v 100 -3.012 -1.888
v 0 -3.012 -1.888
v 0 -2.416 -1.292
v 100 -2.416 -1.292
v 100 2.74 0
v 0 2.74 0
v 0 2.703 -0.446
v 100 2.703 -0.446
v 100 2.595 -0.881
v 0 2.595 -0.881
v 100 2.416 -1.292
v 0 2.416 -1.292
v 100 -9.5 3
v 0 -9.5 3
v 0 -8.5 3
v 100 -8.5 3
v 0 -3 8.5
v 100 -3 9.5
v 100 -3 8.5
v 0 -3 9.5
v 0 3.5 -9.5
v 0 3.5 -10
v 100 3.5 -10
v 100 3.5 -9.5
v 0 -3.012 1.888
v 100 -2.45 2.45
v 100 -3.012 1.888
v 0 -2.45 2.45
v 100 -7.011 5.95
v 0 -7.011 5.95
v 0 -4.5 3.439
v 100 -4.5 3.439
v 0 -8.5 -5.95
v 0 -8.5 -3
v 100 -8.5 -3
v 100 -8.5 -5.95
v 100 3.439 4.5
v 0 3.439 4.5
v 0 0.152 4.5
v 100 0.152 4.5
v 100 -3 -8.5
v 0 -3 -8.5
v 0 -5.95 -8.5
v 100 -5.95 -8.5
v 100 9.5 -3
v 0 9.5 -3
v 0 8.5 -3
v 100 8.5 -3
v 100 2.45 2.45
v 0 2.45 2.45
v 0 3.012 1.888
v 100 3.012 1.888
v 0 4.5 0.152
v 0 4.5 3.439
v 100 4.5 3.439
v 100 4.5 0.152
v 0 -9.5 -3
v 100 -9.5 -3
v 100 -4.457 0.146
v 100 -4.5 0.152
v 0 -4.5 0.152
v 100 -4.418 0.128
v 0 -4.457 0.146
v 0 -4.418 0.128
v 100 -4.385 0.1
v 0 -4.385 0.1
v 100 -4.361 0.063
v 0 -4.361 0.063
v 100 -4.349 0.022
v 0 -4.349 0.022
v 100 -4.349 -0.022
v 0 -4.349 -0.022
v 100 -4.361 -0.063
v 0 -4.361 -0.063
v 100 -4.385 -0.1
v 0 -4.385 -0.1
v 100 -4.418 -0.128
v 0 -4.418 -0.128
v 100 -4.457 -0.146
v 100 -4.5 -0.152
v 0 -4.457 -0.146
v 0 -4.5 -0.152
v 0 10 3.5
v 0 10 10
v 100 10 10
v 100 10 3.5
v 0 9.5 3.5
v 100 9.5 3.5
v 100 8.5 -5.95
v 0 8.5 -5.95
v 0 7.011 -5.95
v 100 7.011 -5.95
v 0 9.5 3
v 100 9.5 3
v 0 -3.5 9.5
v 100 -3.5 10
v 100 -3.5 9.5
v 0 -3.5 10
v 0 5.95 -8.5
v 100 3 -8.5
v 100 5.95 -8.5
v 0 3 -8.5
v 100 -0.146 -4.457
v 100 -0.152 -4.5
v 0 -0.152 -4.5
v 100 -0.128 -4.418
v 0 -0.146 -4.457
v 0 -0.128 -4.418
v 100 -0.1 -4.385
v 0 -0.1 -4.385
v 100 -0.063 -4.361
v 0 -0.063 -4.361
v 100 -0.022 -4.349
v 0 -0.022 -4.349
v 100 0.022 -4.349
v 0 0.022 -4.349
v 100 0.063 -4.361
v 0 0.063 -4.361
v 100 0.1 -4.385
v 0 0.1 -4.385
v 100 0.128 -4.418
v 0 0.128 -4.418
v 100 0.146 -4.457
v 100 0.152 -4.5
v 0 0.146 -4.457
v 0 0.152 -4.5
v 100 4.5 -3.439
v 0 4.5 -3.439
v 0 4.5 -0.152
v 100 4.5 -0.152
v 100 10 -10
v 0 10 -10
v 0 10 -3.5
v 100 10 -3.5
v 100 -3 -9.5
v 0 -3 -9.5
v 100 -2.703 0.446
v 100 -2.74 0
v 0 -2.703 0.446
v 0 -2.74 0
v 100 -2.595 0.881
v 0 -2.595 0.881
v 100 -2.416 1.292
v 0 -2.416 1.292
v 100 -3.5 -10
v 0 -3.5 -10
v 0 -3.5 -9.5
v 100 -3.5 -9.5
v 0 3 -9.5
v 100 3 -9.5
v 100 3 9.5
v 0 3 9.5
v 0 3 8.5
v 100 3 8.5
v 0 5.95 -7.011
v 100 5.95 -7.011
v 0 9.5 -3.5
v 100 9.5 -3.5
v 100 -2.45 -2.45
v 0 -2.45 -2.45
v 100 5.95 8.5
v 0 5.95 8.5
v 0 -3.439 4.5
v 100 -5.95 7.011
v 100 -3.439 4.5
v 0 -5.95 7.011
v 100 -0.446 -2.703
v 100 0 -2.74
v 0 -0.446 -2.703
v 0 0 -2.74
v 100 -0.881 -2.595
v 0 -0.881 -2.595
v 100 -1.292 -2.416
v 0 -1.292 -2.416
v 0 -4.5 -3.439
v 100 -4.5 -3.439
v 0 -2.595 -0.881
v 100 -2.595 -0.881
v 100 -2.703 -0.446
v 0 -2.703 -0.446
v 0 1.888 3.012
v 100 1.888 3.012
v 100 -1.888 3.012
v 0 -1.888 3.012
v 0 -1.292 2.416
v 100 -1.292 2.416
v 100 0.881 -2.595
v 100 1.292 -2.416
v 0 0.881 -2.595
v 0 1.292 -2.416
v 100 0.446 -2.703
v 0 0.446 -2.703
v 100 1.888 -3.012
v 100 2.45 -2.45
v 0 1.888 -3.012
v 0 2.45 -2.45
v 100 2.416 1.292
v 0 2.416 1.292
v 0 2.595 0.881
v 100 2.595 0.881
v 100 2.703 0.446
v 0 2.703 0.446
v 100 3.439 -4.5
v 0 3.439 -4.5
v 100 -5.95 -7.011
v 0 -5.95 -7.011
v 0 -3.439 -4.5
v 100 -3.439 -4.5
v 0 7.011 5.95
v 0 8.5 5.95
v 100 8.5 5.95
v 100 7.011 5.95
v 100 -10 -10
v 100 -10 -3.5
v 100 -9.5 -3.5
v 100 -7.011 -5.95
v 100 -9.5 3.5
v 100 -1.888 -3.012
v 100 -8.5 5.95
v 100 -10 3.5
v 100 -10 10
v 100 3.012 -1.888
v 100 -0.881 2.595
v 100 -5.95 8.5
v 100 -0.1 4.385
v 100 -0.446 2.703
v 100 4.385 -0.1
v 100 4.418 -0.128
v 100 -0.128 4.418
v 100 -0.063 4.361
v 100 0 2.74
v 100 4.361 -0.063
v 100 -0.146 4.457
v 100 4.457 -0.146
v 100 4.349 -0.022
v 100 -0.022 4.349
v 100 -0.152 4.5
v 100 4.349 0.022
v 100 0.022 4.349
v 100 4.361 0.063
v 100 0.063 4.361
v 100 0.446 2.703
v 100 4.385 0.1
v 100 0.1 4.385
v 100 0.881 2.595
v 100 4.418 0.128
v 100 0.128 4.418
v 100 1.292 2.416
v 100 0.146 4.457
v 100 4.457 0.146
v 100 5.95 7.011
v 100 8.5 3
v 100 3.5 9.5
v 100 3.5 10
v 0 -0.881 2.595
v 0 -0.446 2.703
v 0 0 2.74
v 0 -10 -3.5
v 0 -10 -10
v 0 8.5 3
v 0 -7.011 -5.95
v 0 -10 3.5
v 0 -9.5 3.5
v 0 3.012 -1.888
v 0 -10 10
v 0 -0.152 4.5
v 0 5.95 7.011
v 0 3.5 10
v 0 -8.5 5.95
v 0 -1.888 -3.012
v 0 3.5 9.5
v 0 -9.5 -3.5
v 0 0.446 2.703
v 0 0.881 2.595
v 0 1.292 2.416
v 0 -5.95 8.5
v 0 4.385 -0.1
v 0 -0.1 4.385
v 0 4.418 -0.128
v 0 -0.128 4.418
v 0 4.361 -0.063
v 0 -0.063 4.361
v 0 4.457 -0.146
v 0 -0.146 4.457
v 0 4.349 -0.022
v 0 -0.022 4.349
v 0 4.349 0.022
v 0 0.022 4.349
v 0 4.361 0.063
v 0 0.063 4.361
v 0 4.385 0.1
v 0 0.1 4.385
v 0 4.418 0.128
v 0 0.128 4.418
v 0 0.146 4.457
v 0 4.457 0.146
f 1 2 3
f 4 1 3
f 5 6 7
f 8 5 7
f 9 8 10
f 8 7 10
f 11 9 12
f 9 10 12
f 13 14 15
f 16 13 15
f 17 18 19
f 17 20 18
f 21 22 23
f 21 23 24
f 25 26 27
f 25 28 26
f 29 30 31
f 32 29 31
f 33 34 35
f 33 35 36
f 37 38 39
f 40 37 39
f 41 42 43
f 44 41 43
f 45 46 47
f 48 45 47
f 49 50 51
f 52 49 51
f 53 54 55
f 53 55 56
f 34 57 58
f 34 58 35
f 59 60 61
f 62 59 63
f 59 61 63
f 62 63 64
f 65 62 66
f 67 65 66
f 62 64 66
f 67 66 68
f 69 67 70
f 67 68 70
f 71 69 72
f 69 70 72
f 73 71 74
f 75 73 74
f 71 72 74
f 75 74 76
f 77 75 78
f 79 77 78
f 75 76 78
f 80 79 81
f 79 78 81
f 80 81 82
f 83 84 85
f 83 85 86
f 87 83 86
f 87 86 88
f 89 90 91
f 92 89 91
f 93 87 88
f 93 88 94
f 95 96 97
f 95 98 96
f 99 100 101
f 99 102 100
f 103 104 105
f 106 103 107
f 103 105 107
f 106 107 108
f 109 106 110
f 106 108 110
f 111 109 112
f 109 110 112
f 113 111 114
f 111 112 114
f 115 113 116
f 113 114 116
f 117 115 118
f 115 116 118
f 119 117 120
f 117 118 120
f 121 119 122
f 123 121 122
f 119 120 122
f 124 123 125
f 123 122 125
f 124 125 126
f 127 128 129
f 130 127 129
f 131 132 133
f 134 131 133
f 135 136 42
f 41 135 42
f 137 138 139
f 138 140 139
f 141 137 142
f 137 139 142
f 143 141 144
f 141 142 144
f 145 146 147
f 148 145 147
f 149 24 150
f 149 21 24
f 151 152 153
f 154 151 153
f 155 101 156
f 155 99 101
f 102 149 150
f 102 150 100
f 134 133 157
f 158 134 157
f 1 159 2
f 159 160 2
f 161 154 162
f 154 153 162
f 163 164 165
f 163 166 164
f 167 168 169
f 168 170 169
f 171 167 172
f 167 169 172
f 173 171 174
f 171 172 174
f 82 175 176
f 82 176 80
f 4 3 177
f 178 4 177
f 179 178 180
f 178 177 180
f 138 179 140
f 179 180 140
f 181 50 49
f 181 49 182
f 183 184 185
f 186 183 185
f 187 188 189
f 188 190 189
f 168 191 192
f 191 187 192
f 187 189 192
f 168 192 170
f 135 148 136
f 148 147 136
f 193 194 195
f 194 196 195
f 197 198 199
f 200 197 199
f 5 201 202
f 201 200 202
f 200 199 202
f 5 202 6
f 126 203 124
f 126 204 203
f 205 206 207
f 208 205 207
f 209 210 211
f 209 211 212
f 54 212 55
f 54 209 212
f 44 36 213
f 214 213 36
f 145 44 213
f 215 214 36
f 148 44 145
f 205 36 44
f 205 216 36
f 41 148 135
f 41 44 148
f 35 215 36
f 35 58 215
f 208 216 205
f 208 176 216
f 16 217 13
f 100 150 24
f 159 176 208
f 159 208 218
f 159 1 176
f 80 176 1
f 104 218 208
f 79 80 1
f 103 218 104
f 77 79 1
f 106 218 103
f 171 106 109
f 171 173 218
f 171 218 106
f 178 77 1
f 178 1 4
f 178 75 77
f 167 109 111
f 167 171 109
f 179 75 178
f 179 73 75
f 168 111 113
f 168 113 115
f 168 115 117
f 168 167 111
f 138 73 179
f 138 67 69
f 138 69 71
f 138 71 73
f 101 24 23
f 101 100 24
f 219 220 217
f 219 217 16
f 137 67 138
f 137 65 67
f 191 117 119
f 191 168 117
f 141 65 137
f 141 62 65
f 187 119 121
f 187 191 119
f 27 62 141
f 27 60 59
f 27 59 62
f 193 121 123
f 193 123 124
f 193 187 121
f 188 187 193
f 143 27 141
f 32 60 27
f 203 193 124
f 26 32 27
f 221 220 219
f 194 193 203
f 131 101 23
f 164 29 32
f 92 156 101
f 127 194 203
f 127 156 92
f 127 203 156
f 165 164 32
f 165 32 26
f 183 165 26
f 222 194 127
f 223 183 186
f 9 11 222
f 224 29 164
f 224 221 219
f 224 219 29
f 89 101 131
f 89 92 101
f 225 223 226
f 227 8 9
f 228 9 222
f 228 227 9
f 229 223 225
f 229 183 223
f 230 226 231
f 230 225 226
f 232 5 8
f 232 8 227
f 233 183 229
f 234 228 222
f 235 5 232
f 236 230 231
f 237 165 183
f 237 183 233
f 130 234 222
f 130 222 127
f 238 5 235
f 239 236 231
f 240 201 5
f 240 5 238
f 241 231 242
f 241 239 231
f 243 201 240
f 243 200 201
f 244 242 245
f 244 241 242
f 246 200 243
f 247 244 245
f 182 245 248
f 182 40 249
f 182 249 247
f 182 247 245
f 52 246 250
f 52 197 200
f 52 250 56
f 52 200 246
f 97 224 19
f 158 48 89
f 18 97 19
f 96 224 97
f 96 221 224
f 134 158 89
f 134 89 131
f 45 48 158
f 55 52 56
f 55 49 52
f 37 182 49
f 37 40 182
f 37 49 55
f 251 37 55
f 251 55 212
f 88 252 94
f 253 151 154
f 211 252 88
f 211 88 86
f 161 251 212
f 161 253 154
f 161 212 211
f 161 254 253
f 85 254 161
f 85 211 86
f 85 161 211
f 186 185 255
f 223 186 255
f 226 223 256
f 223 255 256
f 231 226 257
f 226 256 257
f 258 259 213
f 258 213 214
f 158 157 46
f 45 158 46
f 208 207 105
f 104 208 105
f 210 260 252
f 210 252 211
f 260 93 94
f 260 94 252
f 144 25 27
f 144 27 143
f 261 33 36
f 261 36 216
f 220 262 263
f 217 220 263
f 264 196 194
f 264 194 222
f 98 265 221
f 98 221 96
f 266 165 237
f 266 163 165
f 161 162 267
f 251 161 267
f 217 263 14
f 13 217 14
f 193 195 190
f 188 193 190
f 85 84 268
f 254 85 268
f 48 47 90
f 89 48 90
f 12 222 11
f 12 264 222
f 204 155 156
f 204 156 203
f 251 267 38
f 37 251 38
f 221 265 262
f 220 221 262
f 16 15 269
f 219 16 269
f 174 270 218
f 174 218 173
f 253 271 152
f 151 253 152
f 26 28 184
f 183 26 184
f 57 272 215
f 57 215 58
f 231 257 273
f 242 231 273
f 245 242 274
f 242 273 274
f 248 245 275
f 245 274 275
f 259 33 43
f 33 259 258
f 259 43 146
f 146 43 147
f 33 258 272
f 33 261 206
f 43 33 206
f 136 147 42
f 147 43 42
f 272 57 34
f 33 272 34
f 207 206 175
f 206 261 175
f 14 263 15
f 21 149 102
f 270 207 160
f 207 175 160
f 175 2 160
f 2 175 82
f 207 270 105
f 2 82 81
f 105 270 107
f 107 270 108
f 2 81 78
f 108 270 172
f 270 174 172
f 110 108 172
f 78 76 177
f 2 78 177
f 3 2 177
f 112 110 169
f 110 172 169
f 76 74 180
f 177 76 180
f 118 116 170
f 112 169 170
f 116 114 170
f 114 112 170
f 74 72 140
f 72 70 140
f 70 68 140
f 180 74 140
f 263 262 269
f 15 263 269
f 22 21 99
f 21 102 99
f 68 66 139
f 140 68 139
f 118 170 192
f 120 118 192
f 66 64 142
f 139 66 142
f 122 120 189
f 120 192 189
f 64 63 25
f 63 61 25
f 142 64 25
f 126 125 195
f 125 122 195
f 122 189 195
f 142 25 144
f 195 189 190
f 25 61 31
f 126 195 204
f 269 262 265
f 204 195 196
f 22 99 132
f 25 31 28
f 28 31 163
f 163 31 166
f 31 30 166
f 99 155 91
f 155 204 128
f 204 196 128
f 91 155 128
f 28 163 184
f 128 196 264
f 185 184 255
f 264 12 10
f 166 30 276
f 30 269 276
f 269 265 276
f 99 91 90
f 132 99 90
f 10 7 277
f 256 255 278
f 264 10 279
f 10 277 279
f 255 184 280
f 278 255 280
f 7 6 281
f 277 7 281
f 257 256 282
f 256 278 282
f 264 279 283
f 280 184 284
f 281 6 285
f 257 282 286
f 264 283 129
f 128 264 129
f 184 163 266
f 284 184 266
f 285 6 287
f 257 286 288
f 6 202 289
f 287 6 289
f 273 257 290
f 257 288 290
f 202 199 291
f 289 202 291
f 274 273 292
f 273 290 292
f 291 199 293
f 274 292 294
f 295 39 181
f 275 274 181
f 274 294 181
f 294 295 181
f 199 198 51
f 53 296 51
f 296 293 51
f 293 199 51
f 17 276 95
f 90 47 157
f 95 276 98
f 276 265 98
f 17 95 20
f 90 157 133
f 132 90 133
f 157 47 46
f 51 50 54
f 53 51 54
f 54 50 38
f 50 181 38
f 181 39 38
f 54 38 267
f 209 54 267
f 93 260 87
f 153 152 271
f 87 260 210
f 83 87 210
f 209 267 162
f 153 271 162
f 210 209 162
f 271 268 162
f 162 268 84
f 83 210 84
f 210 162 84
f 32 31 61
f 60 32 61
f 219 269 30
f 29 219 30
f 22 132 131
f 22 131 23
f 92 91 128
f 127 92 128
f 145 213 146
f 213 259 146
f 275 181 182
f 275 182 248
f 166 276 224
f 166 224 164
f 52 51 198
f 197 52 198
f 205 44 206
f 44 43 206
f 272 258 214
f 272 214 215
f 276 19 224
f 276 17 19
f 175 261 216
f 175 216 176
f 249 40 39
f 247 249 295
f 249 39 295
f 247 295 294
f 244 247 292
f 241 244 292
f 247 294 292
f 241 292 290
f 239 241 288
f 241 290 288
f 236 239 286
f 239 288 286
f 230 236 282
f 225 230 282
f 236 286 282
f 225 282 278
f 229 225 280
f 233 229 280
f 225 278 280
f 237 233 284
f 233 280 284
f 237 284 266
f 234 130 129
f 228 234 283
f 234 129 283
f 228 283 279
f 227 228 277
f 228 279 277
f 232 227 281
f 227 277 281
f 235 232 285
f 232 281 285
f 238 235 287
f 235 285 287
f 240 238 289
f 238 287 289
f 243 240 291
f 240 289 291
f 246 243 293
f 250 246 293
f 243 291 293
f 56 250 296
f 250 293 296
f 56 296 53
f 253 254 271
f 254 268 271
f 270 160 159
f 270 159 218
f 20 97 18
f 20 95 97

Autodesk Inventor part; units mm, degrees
ref_plane "YZ Plane" through (0, 0, 0) normal (1, 0, 0) x (0, 1, 0)
ref_plane "XZ Plane" through (0, 0, 0) normal (0, 1, 0) x (-1, 0, 0)
ref_plane "XY Plane" through (0, 0, 0) normal (0, 0, 1) x (1, 0, 0)
sketch "Sketch1" plane through (0, 0, 0) normal (1, 0, 0) x (0, 1, 0)
  line L0 (-10, -10) -> (10, 10) construction
  line L1 (10, 10) -> (10, 3.5)
  line L2 (10, 3.5) -> (9.5, 3.5)
  line L3 (9.5, 3.5) -> (9.5, 3)
  line L4 (9.5, 3) -> (8.5, 3)
  line L5 (8.5, 3) -> (8.5, 5.95)
  line L6 (8.5, 5.95) -> (7.0107, 5.95)
  line L7 (7.0107, 5.95) -> (4.5, 3.4393)
  line L8 (4.5, 3.4393) -> (4.5, 0.1525)
  line L9 (2.4501, 2.4501) -> (3.0123, 1.888)
  line L10 (3.0123, 1.888) -> (2.4163, 1.292)
  arc A0 (2.74, 0) -> (2.4163, 1.292) centre (0, 0) ccw
  arc A1 (4.5, 0.1525) -> (4.3475, 0) centre (4.5, 0) ccw
  line L11 (10, 10) -> (2.4501, 2.4501)
  line L12 (4.3475, 0) -> (2.74, 0)
  line L13 (0, 0) -> (2.74, 0) construction
  line L14 (10, 10) -> (3.5, 10)
  line L15 (3.5, 10) -> (3.5, 9.5)
  line L16 (3.5, 9.5) -> (3, 9.5)
  line L17 (3, 9.5) -> (3, 8.5)
  line L18 (3, 8.5) -> (5.95, 8.5)
  line L19 (5.95, 8.5) -> (5.95, 7.0107)
  line L20 (5.95, 7.0107) -> (3.4393, 4.5)
  line L21 (3.4393, 4.5) -> (0.1525, 4.5)
  line L22 (2.4501, 2.4501) -> (1.888, 3.0123)
  line L23 (1.888, 3.0123) -> (1.292, 2.4163)
  arc A2 (1.292, 2.4163) -> (0, 2.74) centre (0, 0) ccw
  arc A3 (0, 4.3475) -> (0.1525, 4.5) centre (0, 4.5) ccw
  line L24 (0, 4.3475) -> (0, 2.74)
  line L25 (0, 0) -> (0, 2.74) construction
  line L26 (-8.5, 5.95) -> (-7.0107, 5.95)
  line L27 (-10, 3.5) -> (-9.5, 3.5)
  line L28 (-8.5, 3) -> (-8.5, 5.95)
  line L29 (-9.5, 3.5) -> (-9.5, 3)
  line L30 (-9.5, 3) -> (-8.5, 3)
  line L31 (-5.95, 8.5) -> (-5.95, 7.0107)
  line L32 (-7.0107, 5.95) -> (-4.5, 3.4393)
  line L33 (-5.95, 7.0107) -> (-3.4393, 4.5)
  line L34 (-10, 10) -> (-10, 3.5)
  line L35 (-10, 10) -> (-3.5, 10)
  line L36 (-10, 10) -> (-2.4501, 2.4501)
  line L37 (-3, 8.5) -> (-5.95, 8.5)
  line L38 (-3, 9.5) -> (-3, 8.5)
  line L39 (-3.5, 10) -> (-3.5, 9.5)
  line L40 (-3.5, 9.5) -> (-3, 9.5)
  line L41 (-3.4393, 4.5) -> (-0.1525, 4.5)
  line L42 (-2.4501, 2.4501) -> (-1.888, 3.0123)
  line L43 (-1.888, 3.0123) -> (-1.292, 2.4163)
  arc A4 (0, 2.74) -> (-1.292, 2.4163) centre (0, 0) ccw
  arc A5 (-0.1525, 4.5) -> (0, 4.3475) centre (0, 4.5) ccw
  line L44 (-2.4501, 2.4501) -> (-3.0123, 1.888)
  line L45 (-4.5, 3.4393) -> (-4.5, 0.1525)
  arc A6 (-4.3475, 0) -> (-4.5, 0.1525) centre (-4.5, 0) ccw
  line L46 (0, 4.3475) -> (0, 2.74)
  line L47 (-4.3475, 0) -> (-2.74, 0)
  arc A7 (-2.4163, 1.292) -> (-2.74, 0) centre (0, 0) ccw
  line L48 (0, 0) -> (0, 2.74) construction
  line L49 (-3.0123, 1.888) -> (-2.4163, 1.292)
  line L50 (-5.95, -8.5) -> (-5.95, -7.0107)
  line L51 (-3.5, -10) -> (-3.5, -9.5)
  line L52 (-3, -8.5) -> (-5.95, -8.5)
  line L53 (-3.5, -9.5) -> (-3, -9.5)
  line L54 (-3, -9.5) -> (-3, -8.5)
  line L55 (-8.5, -5.95) -> (-7.0107, -5.95)
  line L56 (-5.95, -7.0107) -> (-3.4393, -4.5)
  line L57 (-7.0107, -5.95) -> (-4.5, -3.4393)
  line L58 (-10, -10) -> (-3.5, -10)
  line L59 (-10, -10) -> (-10, -3.5)
  line L60 (-10, -10) -> (-2.4501, -2.4501)
  line L61 (-8.5, -3) -> (-8.5, -5.95)
  line L62 (-9.5, -3) -> (-8.5, -3)
  line L63 (-10, -3.5) -> (-9.5, -3.5)
  line L64 (-9.5, -3.5) -> (-9.5, -3)
  line L65 (-4.5, -3.4393) -> (-4.5, -0.1525)
  line L66 (-2.4501, -2.4501) -> (-3.0123, -1.888)
  line L67 (-3.0123, -1.888) -> (-2.4163, -1.292)
  arc A8 (-2.74, 0) -> (-2.4163, -1.292) centre (0, 0) ccw
  arc A9 (-4.5, -0.1525) -> (-4.3475, 0) centre (-4.5, 0) ccw
  line L68 (-2.4501, -2.4501) -> (-1.888, -3.0123)
  line L69 (-3.4393, -4.5) -> (-0.1525, -4.5)
  arc A10 (0, -4.3475) -> (-0.1525, -4.5) centre (0, -4.5) ccw
  line L70 (-4.3475, 0) -> (-2.74, 0)
  line L71 (0, -4.3475) -> (0, -2.74)
  arc A11 (-1.292, -2.4163) -> (0, -2.74) centre (0, 0) ccw
  line L72 (0, 0) -> (-2.74, 0) construction
  line L73 (-1.888, -3.0123) -> (-1.292, -2.4163)
  line L74 (8.5, -5.95) -> (7.0107, -5.95)
  line L75 (10, -3.5) -> (9.5, -3.5)
  line L76 (8.5, -3) -> (8.5, -5.95)
  line L77 (9.5, -3.5) -> (9.5, -3)
  line L78 (9.5, -3) -> (8.5, -3)
  line L79 (5.95, -8.5) -> (5.95, -7.0107)
  line L80 (7.0107, -5.95) -> (4.5, -3.4393)
  line L81 (5.95, -7.0107) -> (3.4393, -4.5)
  line L82 (10, -10) -> (10, -3.5)
  line L83 (10, -10) -> (3.5, -10)
  line L84 (10, -10) -> (2.4501, -2.4501)
  line L85 (3, -8.5) -> (5.95, -8.5)
  line L86 (3, -9.5) -> (3, -8.5)
  line L87 (3.5, -10) -> (3.5, -9.5)
  line L88 (3.5, -9.5) -> (3, -9.5)
  line L89 (3.4393, -4.5) -> (0.1525, -4.5)
  line L90 (2.4501, -2.4501) -> (1.888, -3.0123)
  line L91 (1.888, -3.0123) -> (1.292, -2.4163)
  arc A12 (0, -2.74) -> (1.292, -2.4163) centre (0, 0) ccw
  arc A13 (0.1525, -4.5) -> (0, -4.3475) centre (0, -4.5) ccw
  line L92 (2.4501, -2.4501) -> (3.0123, -1.888)
  line L93 (4.5, -3.4393) -> (4.5, -0.1525)
  arc A14 (4.3475, 0) -> (4.5, -0.1525) centre (4.5, 0) ccw
  line L94 (0, -4.3475) -> (0, -2.74)
  line L95 (4.3475, 0) -> (2.74, 0)
  arc A15 (2.4163, -1.292) -> (2.74, 0) centre (0, 0) ccw
  line L96 (0, 0) -> (0, -2.74) construction
  line L97 (3.0123, -1.888) -> (2.4163, -1.292)
  point P0 (9, 3)
  point P1 (3, 9)
  point P2 (-9, 3)
  point P3 (-3, 9)
  point P4 (-3, -9)
  point P5 (-9, -3)
  point P6 (9, -3)
  point P7 (3, -9)
  dimension "d2" = 6.5
  dimension "d3" = 0.5
  dimension "d4" = 4
  dimension "d5" = 3.465
  dimension "d6" = 5.48
  dimension "d7" = 0.795
  dimension "d8" = 0.305
  dimension "d9" = 2.95
  dimension "d11" = 0.75
  dimension "d14" = 45
  dimension "d15" = 10
  dimension "d16" = 1
  dimension "d17" = 3
  dimension "d18" = 45
  dimension "d21" = 360
extrude "Extrusion1" add sketch "Sketch1" along normal blind 100 contours L1 L2 L3 L4 L5 L6 L7 L8 A1 L12 A0 L10 L9 L11 | L11 L22 L23 A2 L24 A3 L21 L20 L19 L18 L17 L16 L15 L14 | L12 A14 L93 L80 L74 L76 L78 L77 L75 L82 L84 L92 L97 A15 | A4 L43 L42 L36 L35 L39 L40 L38 L37 L31 L33 L41 A5 L24 | L84 L83 L87 L88 L86 L85 L79 L81 L89 A13 L71 A12 L91 L90 | L44 L49 A7 L47 A6 L45 L32 L26 L28 L30 L29 L27 L34 L36 | L71 A10 L69 L56 L50 L52 L54 L53 L51 L58 L60 L68 L73 A11 | A8 L67 L66 L60 L59 L63 L64 L62 L61 L55 L57 L65 A9 L47
properties part number "20mm Extrusion 500mm" material "Aluminum 6061"
